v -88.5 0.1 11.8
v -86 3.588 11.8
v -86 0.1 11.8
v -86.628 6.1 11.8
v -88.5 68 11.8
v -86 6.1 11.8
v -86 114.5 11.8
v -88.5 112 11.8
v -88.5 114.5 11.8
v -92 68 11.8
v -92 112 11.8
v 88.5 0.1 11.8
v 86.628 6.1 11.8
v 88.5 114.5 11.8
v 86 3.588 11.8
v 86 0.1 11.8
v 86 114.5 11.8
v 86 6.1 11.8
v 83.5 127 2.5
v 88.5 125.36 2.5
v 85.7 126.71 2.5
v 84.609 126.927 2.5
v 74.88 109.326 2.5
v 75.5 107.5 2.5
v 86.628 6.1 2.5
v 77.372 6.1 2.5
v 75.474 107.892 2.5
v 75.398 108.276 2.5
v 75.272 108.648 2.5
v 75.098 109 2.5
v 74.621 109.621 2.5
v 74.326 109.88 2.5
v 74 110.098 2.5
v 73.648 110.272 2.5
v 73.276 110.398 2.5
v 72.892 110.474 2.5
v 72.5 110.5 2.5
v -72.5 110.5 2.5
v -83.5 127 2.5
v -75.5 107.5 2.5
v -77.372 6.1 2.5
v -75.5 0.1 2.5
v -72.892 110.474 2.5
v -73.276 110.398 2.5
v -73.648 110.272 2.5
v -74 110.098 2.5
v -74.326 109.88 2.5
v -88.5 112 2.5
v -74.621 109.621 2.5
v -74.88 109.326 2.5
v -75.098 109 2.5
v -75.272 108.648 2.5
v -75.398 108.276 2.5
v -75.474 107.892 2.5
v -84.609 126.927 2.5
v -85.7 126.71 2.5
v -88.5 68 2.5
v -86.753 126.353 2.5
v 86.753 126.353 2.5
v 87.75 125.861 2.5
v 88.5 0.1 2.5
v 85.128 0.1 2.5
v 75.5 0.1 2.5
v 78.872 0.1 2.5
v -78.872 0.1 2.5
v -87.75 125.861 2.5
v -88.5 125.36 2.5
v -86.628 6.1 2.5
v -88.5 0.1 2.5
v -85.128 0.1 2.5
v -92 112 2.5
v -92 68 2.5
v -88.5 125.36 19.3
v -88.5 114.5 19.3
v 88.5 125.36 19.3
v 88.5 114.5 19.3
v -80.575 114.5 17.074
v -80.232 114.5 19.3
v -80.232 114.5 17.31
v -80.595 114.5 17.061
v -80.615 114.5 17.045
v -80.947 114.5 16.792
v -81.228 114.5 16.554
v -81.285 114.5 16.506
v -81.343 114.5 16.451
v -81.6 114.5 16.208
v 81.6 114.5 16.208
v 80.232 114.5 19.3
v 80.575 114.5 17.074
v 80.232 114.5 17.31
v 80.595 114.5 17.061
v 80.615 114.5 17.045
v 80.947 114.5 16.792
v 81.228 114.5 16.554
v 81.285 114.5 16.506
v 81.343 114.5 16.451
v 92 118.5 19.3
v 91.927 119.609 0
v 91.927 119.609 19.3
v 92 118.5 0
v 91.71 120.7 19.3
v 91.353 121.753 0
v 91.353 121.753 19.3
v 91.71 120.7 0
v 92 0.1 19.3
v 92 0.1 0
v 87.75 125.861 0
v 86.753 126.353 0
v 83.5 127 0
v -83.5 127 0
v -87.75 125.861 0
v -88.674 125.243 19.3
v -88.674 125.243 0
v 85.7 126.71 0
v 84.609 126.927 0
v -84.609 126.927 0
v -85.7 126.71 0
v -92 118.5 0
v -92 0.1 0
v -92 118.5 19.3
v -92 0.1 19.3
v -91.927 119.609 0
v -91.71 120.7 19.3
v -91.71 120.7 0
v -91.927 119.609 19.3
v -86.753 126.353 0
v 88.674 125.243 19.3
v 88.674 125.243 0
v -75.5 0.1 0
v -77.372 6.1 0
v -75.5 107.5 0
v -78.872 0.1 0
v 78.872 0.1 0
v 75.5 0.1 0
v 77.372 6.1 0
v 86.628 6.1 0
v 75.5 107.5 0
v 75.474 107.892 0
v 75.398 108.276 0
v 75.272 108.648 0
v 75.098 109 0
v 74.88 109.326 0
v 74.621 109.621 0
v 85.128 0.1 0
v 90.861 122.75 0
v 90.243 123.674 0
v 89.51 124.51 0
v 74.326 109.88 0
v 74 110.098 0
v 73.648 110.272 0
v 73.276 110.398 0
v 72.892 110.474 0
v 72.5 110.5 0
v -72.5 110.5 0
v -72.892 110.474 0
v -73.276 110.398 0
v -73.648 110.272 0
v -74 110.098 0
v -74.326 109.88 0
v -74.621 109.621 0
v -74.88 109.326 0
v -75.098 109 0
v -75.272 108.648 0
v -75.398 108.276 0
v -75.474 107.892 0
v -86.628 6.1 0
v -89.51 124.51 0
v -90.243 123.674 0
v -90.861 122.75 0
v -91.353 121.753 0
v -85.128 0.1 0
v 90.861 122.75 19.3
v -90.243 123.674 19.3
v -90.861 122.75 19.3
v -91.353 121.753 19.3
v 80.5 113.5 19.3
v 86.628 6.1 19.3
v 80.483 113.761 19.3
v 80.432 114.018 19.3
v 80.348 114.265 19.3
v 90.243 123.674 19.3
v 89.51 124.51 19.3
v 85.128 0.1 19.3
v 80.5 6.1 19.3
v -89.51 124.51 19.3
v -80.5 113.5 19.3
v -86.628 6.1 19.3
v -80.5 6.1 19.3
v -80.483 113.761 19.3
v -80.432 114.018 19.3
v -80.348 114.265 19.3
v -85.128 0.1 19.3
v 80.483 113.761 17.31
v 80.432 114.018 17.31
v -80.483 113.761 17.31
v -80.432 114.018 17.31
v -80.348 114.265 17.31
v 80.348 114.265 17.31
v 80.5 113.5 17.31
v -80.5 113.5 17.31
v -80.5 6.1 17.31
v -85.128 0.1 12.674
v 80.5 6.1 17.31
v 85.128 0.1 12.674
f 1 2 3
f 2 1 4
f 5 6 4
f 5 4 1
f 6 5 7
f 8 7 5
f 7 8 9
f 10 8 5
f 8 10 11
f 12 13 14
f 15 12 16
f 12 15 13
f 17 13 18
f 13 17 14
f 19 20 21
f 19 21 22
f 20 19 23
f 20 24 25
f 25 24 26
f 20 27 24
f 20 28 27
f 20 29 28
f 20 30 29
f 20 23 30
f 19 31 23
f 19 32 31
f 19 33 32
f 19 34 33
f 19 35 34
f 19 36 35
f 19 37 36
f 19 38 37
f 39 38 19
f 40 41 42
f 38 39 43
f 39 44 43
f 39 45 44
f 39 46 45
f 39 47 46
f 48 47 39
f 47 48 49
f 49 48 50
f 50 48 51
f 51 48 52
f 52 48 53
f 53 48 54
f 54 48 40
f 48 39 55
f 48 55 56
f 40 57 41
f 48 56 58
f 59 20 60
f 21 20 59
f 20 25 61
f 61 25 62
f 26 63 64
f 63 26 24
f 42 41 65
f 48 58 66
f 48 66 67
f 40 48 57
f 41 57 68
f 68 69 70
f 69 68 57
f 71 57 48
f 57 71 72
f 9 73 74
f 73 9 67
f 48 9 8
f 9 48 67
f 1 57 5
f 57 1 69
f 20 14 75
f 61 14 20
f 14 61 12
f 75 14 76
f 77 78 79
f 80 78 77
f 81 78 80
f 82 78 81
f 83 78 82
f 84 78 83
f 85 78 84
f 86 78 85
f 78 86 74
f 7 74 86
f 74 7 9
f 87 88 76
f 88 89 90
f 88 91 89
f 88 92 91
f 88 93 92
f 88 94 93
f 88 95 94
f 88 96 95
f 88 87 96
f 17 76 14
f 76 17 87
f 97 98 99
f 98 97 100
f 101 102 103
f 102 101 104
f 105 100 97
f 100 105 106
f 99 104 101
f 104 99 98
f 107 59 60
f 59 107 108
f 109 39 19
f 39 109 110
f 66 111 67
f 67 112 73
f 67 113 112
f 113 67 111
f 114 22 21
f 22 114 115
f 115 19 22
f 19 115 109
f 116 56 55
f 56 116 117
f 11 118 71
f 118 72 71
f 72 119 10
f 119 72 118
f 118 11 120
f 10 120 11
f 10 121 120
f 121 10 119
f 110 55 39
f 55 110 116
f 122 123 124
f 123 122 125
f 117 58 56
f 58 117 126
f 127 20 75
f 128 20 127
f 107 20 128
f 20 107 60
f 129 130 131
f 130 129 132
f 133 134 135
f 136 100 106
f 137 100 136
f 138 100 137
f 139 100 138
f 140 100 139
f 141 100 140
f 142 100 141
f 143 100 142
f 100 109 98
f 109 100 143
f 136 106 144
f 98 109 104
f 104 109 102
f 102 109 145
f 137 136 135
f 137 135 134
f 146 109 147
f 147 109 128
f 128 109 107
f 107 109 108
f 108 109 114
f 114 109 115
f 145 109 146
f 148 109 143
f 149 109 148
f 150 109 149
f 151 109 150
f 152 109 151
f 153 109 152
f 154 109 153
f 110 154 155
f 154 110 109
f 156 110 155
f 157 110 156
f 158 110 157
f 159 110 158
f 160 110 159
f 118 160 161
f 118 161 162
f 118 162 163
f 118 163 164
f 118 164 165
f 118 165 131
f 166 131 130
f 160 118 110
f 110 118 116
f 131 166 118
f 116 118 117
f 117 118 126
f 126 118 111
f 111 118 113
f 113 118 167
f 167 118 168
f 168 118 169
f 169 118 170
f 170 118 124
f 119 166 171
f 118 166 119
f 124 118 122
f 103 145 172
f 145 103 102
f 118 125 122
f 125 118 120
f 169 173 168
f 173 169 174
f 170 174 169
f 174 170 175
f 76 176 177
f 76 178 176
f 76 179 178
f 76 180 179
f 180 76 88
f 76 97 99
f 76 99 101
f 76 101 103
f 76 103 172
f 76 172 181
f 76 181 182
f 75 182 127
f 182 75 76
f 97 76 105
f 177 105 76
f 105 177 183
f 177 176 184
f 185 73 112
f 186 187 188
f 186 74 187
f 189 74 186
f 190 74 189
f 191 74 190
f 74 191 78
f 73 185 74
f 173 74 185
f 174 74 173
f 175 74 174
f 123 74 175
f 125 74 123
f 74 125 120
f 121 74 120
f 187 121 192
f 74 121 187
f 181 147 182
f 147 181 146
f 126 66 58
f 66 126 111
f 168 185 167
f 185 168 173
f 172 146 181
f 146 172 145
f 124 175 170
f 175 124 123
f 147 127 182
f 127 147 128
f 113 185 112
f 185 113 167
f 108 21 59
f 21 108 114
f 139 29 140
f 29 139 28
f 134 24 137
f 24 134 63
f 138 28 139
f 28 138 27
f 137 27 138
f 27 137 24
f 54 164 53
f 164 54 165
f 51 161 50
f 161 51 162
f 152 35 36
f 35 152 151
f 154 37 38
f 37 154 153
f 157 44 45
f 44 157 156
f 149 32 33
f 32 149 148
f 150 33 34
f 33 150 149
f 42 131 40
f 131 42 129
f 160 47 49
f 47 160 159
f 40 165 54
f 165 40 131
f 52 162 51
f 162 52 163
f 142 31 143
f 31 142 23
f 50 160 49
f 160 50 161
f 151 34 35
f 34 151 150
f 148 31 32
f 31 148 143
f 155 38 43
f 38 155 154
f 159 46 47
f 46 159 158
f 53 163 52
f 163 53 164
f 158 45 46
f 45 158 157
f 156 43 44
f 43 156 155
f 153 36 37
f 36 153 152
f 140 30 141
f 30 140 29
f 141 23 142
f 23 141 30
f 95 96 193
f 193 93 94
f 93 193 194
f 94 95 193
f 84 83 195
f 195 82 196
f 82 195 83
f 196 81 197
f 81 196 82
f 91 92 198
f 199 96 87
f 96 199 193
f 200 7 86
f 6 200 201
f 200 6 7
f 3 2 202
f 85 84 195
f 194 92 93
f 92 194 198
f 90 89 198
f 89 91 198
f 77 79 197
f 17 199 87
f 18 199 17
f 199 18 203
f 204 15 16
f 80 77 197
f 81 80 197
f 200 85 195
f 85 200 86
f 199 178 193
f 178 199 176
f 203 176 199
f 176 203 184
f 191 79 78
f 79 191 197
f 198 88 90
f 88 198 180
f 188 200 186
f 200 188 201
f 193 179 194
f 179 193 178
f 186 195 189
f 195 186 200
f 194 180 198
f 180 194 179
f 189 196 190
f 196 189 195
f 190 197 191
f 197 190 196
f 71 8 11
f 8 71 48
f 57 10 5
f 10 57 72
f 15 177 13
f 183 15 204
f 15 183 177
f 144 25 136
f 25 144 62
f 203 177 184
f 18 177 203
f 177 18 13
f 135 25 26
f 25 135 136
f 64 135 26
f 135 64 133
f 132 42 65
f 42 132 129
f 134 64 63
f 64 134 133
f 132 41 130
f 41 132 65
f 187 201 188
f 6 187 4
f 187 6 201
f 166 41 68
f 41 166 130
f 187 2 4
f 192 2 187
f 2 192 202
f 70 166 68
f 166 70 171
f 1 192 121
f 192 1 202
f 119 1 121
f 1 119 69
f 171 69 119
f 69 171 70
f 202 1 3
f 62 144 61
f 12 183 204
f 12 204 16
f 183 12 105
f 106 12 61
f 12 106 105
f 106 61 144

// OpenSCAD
// file: surface-go-window-frame.scad
// Slide-in window frame for the Surface Go (1st gen) shop screen.
//
// The flat front face goes against the inside of the window glass, taped all
// the way round (12 mm VHB, e.g. 3M 5952). The tablet slides in from the open
// top edge, between the front lip and the back lip, and rests on the bottom wall.
// The Surface Connect slot is on the tablet's right edge as seen from outside
// (looking at the screen), near the bottom. Seen from the room that is the left wall.
//
// This file renders the landscape frame (open on a long edge).
// surface-go-window-frame-portrait.scad renders the portrait one (open on a
// short edge, charger at the bottom). It reuses the modules here, so change
// dimensions in this file only. The -left/-right and -portrait-top/-bottom
// files render the two halves of each frame for a 256 mm bed.
//
// Anti-rattle: the pocket has 1 mm of front-back play. Stick a strip of 1 mm
// self-adhesive felt along the back of the tablet's two side edges and bottom
// edge (within 6 mm of the edge, where the back rim overlaps it).
//
// Print front face down on the bed (clean, flat face for the tape). No supports:
// the back rim overhangs 2.5 mm flat, then slopes at 45 degrees, and there is
// no rim over the opening. Only the charger slot is bridged (60 mm).
// Strength: 4 walls (perimeters), 30% gyroid infill.
// Units mm. Coordinates as seen from the ROOM (the tablet's back) in landscape: x right,
// y up, z from the glass (0) towards the room.
//
// Licence: CC BY-NC 4.0

/* [Tablet - Surface Go 1 is 245 x 175 x 8.3] */
tab_w = 245.0;
tab_h = 175.0;
tab_t = 8.3;
clear = 1.0;           // per side around the tablet edge
play_t = 1.0;          // front-back play; a 1 mm felt strip takes it up
tab_r = 5.0;           // pocket corner radius (keep <= tablet's corner radius)

/* [Frame] */
wall = 3.5;            // side wall thickness (3.5 keeps the frame inside a 256 mm bed)
lip = 2.5;             // front lip thickness (glass side)
lip_over = 13.0;       // front lip covers the bezel this far (screen starts ~17 in)
back_flat = 2.5;       // back rim: flat overhang (prints without support)
back_over = 8.0;       // back rim: total reach over the tablet's back
back_skin = 2.0;       // back rim thickness above the 45 degree slope

/* [Cutouts - tablet edges as in landscape] */
// (room view: the charger edge is the LEFT wall, the buttons are top RIGHT)
cable_y = [-78, -18];  // Surface Connect slot in the left wall (room view), y range
btn_x = [68, 112];     // power + volume on the top edge (room view), x range

/* [Split for printing - two halves, dovetails + glue] */
dt_neck = 6.0;         // dovetail width at the seam
dt_head = 9.0;         // dovetail width at its tip
dt_len = 6.0;          // how far the dovetail reaches into the other half
dt_fit = 0.2;          // total gap between the halves (all round the dovetail)

$fn = 48;

// --- derived ---------------------------------------------------------------
pw = tab_w + 2 * clear;          // pocket 247 x 177
ph = tab_h + 2 * clear;
ow = pw + 2 * wall;              // outer 254 x 184
oh = ph + 2 * wall;
o_r = tab_r + wall;

z_pocket0 = lip;
z_back = lip + tab_t + play_t;   // tablet back / start of back lip
z_slope = z_back + (back_over - back_flat);
z_top = z_slope + back_skin;

win_w = pw - 2 * lip_over;       // 221 x 151 window (screen ~211 x 141)
win_h = ph - 2 * lip_over;

echo(str("outer ", ow, " x ", oh, " x ", z_top, "  window ", win_w, " x ", win_h,
         "  tape strip ", wall + lip_over));

assert(ow <= 255 && oh <= 255, "frame no longer fits a 256 mm bed");

// --- helpers ---------------------------------------------------------------
module rrect(w, h, r) {
    offset(r = r) square([w - 2 * r, h - 2 * r], center = true);
}

module box(x0, x1, y0, y1, z0, z1) {
    translate([x0, y0, z0]) cube([x1 - x0, y1 - y0, z1 - z0]);
}

module slab(inset, z) {
    translate([0, 0, z]) linear_extrude(0.01)
        rrect(pw - 2 * inset, ph - 2 * inset, max(tab_r - inset, 2));
}

// --- frame -----------------------------------------------------------------
// open = "top"  : landscape, tablet slides down onto its long bottom edge
// open = "right": portrait, opening on the edge opposite the charger (room
//                 view right wall); hung so the charger edge is at the bottom
module frame(open = "top") frame_body(open);

module frame_body(open) {
    big = 50;
    difference() {
        linear_extrude(z_top) rrect(ow, oh, o_r);

        // screen window, all the way through
        translate([0, 0, -1]) linear_extrude(z_top + 2) rrect(win_w, win_h, 3);
        // tablet pocket
        translate([0, 0, z_pocket0]) linear_extrude(z_back - z_pocket0) rrect(pw, ph, tab_r);
        // back opening: flat overhang, then 45 degree slope, then straight up
        hull() {
            slab(back_flat, z_back - 0.01);
            slab(back_over, z_slope);
        }
        translate([0, 0, z_slope - 0.01])
            linear_extrude(z_top) rrect(pw - 2 * back_over, ph - 2 * back_over, 2);

        // the opening: wall removed between the lips, and no back rim on that
        // edge (it would be a full-width bridge; the side rims hold the tablet)
        if (open == "top") {
            box(-pw / 2, pw / 2, 0, big + ph / 2, z_pocket0, z_back);
            box(-pw / 2, pw / 2, ph / 2 - back_over - 1, big + ph / 2, z_back - 0.01, z_top + 1);
        } else {
            box(0, big + pw / 2, -ph / 2, ph / 2, z_pocket0, z_back);
            box(pw / 2 - back_over - 1, big + pw / 2, -ph / 2, ph / 2, z_back - 0.01, z_top + 1);
        }

        // Surface Connect slot (left wall seen from the room = right edge seen from outside)
        box(-ow / 2 - 1, -pw / 2 + 1, cable_y[0], cable_y[1], z_pocket0, z_back);
        // power / volume access (top edge) when the top is closed
        if (open != "top")
            box(btn_x[0], btn_x[1], ph / 2 - 1, oh / 2 + 1, z_pocket0, z_back);
    }
}

// --- split into two halves (seam at x = 0, frame coordinates) --------------
// A 256 mm bed can't really take the 254 mm frame, so each frame also comes as
// two halves. A dovetail on the -x half sits in the middle of the front lip band
// above and below the screen window and locks into the +x half. The lip is the
// face on the bed, so the dovetails print flat; the VHB tape also spans the seam.
dt_y = (win_h / 2 + ph / 2) / 2;   // centre of the lip band
assert(dt_y + dt_head / 2 <= ph / 2 - 1.5, "dovetail too close to the pocket edge");
assert(dt_y - dt_head / 2 >= win_h / 2 + 1.5, "dovetail too close to the screen window");

module minus_x_region() {
    translate([-ow, -oh]) square([ow, 2 * oh]);
    for (s = [1, -1])
        polygon([[-1, s * dt_y - dt_neck / 2], [0, s * dt_y - dt_neck / 2],
                 [dt_len, s * dt_y - dt_head / 2], [dt_len, s * dt_y + dt_head / 2],
                 [0, s * dt_y + dt_neck / 2], [-1, s * dt_y + dt_neck / 2]]);
}

// half = -1 (the -x half, with the dovetails) or 1 (the +x half, with the sockets)
module frame_half(open, half) {
    if (half < 0)
        intersection() {
            frame(open);
            translate([0, 0, -1]) linear_extrude(z_top + 2) offset(delta = -dt_fit / 2) minus_x_region();
        }
    else
        difference() {
            frame(open);
            translate([0, 0, -1]) linear_extrude(z_top + 2) offset(delta = dt_fit / 2) minus_x_region();
        }
}

// Shown as it hangs: portrait is turned so the opening is at the top.
module frame_landscape() frame("top");
module frame_portrait() rotate([0, 0, 90]) frame("right");
module frame_landscape_left()   frame_half("top", -1);
module frame_landscape_right()  frame_half("top", 1);
module frame_portrait_bottom()  rotate([0, 0, 90]) frame_half("right", -1);
module frame_portrait_top()     rotate([0, 0, 90]) frame_half("right", 1);

frame_landscape();
// main file
// Top half of the portrait Surface Go window frame, for a 256 mm bed (Bambu A1/P1/X1).
// Print front face down, no supports. Glue to the other half at the dovetails.
// Dimensions come from surface-go-window-frame.scad.
use <surface-go-window-frame.scad>

frame_portrait_top();
